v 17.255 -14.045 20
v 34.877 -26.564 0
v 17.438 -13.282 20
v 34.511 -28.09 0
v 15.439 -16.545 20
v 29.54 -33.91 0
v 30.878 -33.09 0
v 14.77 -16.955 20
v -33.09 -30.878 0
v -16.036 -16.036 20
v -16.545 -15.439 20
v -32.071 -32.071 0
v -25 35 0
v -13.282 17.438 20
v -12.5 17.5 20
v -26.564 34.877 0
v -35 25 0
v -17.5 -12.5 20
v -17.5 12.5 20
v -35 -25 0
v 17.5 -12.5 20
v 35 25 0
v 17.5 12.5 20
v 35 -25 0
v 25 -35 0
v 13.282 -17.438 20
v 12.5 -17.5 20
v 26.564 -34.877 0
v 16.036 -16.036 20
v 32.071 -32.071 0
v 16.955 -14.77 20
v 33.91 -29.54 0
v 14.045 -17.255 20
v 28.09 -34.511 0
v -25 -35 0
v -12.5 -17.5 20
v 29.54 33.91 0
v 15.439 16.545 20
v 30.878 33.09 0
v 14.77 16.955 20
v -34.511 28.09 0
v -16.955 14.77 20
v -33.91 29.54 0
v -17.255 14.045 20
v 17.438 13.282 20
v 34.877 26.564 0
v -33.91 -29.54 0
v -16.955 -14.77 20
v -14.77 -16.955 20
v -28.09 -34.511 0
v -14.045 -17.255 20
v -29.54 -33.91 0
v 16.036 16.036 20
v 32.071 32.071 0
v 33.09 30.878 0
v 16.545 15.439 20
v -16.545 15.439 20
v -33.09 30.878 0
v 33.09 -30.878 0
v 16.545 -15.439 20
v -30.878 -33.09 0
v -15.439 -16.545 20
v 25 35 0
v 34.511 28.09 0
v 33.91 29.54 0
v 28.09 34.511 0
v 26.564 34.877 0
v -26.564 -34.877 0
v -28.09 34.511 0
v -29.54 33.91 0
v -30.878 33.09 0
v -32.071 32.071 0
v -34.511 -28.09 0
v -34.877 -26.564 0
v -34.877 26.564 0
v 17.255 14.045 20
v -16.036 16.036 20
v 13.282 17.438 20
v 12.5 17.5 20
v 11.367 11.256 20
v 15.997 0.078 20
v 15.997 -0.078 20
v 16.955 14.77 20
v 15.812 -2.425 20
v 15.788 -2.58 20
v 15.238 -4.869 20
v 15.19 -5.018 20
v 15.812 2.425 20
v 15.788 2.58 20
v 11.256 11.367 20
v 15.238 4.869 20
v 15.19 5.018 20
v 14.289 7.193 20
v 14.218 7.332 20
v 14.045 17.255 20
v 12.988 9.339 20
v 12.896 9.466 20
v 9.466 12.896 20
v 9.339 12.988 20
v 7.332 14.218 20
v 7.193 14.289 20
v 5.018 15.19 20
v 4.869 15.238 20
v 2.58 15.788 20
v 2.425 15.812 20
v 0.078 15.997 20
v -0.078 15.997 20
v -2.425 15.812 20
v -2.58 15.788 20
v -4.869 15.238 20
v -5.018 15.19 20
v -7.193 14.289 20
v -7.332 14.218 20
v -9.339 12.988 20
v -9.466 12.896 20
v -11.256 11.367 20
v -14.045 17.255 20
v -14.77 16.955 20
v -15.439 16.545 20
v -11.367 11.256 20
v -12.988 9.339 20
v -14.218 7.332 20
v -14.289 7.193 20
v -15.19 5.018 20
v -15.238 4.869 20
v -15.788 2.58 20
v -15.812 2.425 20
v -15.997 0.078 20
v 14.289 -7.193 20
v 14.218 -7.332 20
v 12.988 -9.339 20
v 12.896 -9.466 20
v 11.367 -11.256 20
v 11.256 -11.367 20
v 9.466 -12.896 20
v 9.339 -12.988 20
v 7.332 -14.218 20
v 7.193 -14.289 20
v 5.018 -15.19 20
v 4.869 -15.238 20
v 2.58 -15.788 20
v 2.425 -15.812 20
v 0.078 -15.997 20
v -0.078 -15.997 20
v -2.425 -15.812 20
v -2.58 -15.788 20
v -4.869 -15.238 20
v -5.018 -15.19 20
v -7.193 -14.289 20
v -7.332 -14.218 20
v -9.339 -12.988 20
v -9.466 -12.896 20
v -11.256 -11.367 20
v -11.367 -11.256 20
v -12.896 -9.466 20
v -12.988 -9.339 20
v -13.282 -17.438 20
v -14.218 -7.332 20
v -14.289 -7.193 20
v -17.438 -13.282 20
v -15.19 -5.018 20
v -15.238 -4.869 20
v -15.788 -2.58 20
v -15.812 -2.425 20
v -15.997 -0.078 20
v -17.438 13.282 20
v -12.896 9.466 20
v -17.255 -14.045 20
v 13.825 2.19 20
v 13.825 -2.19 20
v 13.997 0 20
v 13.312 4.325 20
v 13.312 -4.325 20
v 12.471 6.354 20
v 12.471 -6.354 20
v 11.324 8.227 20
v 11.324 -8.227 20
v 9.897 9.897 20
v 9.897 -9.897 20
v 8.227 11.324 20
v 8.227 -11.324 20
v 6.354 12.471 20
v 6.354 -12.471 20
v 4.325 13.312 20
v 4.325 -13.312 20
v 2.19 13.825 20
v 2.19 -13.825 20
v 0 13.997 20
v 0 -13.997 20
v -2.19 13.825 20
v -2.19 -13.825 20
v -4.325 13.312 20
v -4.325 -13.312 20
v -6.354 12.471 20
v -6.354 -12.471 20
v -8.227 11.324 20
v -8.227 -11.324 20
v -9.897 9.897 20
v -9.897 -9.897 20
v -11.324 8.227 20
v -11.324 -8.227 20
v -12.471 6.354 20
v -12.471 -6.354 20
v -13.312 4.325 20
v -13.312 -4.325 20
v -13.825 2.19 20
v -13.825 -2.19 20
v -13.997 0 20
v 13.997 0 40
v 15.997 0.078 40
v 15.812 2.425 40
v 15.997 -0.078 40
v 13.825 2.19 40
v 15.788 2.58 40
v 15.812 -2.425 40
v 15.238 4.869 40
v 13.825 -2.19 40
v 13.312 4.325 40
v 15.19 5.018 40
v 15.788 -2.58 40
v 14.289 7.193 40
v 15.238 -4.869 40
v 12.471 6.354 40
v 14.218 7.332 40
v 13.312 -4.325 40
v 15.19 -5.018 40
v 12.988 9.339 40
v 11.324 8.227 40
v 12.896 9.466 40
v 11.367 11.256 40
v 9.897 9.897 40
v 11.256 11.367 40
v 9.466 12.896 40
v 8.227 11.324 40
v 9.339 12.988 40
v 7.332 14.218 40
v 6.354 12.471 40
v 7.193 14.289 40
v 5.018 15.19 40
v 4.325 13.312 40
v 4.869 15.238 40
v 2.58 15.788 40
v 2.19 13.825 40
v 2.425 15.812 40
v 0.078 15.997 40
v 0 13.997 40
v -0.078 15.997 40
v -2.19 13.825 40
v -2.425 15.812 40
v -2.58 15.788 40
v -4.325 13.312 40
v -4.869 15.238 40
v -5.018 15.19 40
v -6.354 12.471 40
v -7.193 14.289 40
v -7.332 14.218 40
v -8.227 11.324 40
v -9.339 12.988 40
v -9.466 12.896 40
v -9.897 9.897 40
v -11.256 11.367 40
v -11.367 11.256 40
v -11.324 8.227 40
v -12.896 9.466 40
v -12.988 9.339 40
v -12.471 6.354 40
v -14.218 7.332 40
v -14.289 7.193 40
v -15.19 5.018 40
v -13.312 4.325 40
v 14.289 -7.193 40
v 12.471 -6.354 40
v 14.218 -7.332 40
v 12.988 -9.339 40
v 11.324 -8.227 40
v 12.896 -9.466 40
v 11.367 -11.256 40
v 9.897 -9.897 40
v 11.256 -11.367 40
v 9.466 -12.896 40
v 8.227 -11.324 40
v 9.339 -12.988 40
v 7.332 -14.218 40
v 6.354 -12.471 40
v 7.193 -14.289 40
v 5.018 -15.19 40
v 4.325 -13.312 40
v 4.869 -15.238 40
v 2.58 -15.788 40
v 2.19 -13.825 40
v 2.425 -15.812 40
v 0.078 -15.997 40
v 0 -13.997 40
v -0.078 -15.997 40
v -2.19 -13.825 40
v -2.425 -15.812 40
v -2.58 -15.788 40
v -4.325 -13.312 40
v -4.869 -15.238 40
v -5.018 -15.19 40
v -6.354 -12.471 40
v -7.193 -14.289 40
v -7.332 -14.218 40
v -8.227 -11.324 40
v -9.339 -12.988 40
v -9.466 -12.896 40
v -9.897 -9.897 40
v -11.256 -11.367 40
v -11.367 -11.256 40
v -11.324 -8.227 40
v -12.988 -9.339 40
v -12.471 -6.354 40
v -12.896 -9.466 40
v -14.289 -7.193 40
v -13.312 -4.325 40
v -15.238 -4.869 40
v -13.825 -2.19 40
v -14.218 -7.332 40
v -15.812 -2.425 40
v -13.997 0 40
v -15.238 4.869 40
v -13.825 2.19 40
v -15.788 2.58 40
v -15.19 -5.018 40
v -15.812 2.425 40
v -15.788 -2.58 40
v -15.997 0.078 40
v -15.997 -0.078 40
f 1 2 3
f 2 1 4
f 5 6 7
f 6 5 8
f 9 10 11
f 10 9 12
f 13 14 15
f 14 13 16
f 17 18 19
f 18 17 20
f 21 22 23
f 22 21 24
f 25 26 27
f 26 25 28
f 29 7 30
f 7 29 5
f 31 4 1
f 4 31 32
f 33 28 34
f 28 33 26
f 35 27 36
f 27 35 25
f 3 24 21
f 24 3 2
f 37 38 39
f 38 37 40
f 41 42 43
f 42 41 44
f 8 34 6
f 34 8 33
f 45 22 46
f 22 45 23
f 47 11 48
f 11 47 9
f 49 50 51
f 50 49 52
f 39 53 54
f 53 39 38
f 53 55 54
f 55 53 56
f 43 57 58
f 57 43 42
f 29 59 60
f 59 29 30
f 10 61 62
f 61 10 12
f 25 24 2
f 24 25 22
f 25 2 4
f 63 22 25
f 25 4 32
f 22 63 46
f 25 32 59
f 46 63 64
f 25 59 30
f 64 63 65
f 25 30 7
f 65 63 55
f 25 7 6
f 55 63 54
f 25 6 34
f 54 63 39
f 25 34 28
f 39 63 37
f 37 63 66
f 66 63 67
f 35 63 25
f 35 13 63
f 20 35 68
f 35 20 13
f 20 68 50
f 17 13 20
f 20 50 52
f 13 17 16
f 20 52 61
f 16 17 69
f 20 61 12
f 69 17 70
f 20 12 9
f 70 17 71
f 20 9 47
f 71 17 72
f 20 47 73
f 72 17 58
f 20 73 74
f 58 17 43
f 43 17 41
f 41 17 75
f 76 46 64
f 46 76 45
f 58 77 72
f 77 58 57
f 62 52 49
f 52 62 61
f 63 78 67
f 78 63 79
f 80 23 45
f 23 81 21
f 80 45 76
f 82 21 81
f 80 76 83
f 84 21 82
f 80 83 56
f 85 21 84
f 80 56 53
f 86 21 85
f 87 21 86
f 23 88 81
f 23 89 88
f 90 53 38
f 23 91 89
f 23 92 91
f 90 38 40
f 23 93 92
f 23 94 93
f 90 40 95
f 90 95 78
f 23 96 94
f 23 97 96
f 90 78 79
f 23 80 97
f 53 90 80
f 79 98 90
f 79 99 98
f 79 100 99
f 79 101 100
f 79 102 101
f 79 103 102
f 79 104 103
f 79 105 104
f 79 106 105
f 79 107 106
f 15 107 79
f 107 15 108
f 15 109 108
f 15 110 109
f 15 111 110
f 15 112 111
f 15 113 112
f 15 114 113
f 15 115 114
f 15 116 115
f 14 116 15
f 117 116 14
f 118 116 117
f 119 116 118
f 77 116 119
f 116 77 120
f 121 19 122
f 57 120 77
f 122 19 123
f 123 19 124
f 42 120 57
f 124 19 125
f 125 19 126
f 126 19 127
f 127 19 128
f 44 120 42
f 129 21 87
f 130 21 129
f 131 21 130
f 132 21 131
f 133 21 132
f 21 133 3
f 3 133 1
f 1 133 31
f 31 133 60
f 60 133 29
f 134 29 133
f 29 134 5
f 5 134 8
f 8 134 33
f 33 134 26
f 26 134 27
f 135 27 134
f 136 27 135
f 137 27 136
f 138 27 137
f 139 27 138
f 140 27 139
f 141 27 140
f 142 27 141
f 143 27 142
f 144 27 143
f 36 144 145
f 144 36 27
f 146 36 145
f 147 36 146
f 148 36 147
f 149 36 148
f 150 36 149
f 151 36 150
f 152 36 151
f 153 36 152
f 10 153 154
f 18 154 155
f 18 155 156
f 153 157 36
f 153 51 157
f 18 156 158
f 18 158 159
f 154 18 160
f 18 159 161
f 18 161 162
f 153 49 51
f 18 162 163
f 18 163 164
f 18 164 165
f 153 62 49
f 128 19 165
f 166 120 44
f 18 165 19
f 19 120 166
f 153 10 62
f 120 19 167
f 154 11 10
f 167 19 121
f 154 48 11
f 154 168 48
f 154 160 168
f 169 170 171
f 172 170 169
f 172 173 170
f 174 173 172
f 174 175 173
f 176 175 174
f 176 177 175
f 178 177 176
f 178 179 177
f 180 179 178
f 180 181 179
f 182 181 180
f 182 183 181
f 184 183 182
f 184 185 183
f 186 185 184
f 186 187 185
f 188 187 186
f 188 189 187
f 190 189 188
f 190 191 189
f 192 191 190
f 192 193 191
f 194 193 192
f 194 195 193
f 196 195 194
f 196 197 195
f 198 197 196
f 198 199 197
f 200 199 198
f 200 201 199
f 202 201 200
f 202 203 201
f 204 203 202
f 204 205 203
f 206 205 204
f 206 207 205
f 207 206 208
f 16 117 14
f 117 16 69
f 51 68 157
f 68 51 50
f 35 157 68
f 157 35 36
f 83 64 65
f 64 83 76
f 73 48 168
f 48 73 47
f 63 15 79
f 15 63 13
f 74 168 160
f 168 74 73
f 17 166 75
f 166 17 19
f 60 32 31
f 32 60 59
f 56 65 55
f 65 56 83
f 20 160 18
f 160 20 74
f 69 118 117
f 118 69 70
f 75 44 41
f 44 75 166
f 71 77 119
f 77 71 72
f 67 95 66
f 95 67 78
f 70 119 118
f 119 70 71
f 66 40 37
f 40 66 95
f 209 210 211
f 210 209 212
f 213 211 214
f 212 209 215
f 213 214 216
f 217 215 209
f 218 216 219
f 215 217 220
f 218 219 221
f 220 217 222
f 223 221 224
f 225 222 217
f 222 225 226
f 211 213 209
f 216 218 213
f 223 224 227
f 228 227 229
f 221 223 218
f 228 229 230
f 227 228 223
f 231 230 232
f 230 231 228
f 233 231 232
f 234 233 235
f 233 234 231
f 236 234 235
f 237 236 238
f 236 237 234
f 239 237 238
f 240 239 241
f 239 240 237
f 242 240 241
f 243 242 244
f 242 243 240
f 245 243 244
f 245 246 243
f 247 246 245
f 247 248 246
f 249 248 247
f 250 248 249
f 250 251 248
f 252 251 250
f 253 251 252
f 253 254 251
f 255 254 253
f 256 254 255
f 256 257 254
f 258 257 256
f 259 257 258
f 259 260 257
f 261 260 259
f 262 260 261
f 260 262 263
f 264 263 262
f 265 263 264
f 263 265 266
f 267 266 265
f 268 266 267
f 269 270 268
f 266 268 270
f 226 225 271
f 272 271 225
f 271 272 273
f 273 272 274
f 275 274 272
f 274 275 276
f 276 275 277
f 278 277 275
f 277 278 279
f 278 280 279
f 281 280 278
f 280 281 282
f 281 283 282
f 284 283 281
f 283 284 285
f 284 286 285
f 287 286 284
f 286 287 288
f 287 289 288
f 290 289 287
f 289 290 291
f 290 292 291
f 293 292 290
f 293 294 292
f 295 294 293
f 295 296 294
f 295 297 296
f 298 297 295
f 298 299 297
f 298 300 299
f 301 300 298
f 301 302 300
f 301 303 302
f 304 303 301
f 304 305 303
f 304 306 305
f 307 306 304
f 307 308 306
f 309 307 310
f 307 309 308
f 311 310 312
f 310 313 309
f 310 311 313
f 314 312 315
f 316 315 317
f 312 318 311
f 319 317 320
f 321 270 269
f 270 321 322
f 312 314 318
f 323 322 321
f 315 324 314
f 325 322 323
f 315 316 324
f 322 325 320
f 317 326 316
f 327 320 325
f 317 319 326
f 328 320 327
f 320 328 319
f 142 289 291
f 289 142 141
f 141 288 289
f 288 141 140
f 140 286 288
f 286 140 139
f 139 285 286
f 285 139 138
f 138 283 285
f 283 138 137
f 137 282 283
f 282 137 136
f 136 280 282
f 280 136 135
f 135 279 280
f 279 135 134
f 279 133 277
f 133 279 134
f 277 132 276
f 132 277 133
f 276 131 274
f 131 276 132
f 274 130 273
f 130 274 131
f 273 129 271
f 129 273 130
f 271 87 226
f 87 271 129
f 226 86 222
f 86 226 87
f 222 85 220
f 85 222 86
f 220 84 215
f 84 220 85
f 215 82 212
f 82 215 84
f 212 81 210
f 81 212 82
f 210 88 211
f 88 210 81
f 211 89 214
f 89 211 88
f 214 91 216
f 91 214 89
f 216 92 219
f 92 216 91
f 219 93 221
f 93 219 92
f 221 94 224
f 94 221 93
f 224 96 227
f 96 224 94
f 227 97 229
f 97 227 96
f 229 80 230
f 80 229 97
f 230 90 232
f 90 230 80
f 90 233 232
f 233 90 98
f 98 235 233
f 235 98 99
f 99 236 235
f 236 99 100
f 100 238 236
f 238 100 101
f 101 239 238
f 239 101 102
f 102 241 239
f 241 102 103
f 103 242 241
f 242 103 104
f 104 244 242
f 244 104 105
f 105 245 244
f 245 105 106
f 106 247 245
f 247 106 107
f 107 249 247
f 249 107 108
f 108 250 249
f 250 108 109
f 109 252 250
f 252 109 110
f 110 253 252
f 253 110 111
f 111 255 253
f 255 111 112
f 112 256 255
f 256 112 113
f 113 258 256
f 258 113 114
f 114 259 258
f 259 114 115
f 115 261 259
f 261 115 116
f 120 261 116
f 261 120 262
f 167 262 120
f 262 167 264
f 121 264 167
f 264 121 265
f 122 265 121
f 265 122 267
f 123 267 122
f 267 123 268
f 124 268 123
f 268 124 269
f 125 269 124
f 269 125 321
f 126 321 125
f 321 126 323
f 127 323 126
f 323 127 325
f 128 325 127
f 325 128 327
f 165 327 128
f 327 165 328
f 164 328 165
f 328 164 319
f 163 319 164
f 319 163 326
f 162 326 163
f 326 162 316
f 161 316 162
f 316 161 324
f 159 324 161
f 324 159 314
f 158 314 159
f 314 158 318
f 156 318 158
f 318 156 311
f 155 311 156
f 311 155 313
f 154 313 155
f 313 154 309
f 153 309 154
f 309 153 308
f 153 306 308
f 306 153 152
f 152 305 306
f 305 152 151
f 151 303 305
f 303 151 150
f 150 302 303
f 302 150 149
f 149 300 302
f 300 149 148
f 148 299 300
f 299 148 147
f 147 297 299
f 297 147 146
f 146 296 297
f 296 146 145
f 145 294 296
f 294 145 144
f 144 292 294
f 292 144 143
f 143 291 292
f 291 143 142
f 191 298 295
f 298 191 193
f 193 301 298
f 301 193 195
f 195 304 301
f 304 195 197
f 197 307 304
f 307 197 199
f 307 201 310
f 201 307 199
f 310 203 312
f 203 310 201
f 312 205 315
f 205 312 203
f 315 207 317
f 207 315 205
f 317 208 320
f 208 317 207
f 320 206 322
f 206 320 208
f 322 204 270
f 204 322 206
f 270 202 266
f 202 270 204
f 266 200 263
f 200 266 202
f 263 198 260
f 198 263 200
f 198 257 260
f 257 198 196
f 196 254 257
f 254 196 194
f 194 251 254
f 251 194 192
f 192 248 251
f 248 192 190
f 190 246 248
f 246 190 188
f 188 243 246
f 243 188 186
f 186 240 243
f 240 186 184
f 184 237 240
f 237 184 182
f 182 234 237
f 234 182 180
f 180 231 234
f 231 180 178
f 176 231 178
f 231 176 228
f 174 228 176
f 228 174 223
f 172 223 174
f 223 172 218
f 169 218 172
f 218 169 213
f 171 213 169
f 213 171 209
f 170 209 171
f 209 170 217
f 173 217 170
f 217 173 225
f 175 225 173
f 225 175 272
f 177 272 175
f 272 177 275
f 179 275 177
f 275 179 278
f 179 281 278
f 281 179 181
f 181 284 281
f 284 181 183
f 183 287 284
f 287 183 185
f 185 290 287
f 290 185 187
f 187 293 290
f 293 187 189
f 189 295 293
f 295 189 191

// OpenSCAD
// Volume: 59915.78719724622, SurfaceArea: 15131.298531280176
// offset.scad - Example for offset() usage in OpenSCAD

$fn = 40;

foot_height = 20;

echo(version=version());

module outline(wall = 1) {
  difference() {
    offset(wall / 2) children();
    offset(-wall / 2) children();
  }
}

// offsetting with a positive value allows to create rounded corners easily
linear_extrude(height = foot_height, scale = 0.5) {
  offset(10) {
    square(50, center = true);
  }
}

translate([0, 0, foot_height]) {
  linear_extrude(height = 20) {
    outline(wall = 2) circle(15);
  }
}

%cylinder(r = 14, h = 100);
%translate([0, 0, 100]) sphere(r = 30);



// Written in 2014 by Torsten Paul <Torsten.Paul@gmx.de>
//
// To the extent possible under law, the author(s) have dedicated all
// copyright and related and neighboring rights to this software to the
// public domain worldwide. This software is distributed without any
// warranty.
//
// You should have received a copy of the CC0 Public Domain
// Dedication along with this software.
// If not, see <http://creativecommons.org/publicdomain/zero/1.0/>.
